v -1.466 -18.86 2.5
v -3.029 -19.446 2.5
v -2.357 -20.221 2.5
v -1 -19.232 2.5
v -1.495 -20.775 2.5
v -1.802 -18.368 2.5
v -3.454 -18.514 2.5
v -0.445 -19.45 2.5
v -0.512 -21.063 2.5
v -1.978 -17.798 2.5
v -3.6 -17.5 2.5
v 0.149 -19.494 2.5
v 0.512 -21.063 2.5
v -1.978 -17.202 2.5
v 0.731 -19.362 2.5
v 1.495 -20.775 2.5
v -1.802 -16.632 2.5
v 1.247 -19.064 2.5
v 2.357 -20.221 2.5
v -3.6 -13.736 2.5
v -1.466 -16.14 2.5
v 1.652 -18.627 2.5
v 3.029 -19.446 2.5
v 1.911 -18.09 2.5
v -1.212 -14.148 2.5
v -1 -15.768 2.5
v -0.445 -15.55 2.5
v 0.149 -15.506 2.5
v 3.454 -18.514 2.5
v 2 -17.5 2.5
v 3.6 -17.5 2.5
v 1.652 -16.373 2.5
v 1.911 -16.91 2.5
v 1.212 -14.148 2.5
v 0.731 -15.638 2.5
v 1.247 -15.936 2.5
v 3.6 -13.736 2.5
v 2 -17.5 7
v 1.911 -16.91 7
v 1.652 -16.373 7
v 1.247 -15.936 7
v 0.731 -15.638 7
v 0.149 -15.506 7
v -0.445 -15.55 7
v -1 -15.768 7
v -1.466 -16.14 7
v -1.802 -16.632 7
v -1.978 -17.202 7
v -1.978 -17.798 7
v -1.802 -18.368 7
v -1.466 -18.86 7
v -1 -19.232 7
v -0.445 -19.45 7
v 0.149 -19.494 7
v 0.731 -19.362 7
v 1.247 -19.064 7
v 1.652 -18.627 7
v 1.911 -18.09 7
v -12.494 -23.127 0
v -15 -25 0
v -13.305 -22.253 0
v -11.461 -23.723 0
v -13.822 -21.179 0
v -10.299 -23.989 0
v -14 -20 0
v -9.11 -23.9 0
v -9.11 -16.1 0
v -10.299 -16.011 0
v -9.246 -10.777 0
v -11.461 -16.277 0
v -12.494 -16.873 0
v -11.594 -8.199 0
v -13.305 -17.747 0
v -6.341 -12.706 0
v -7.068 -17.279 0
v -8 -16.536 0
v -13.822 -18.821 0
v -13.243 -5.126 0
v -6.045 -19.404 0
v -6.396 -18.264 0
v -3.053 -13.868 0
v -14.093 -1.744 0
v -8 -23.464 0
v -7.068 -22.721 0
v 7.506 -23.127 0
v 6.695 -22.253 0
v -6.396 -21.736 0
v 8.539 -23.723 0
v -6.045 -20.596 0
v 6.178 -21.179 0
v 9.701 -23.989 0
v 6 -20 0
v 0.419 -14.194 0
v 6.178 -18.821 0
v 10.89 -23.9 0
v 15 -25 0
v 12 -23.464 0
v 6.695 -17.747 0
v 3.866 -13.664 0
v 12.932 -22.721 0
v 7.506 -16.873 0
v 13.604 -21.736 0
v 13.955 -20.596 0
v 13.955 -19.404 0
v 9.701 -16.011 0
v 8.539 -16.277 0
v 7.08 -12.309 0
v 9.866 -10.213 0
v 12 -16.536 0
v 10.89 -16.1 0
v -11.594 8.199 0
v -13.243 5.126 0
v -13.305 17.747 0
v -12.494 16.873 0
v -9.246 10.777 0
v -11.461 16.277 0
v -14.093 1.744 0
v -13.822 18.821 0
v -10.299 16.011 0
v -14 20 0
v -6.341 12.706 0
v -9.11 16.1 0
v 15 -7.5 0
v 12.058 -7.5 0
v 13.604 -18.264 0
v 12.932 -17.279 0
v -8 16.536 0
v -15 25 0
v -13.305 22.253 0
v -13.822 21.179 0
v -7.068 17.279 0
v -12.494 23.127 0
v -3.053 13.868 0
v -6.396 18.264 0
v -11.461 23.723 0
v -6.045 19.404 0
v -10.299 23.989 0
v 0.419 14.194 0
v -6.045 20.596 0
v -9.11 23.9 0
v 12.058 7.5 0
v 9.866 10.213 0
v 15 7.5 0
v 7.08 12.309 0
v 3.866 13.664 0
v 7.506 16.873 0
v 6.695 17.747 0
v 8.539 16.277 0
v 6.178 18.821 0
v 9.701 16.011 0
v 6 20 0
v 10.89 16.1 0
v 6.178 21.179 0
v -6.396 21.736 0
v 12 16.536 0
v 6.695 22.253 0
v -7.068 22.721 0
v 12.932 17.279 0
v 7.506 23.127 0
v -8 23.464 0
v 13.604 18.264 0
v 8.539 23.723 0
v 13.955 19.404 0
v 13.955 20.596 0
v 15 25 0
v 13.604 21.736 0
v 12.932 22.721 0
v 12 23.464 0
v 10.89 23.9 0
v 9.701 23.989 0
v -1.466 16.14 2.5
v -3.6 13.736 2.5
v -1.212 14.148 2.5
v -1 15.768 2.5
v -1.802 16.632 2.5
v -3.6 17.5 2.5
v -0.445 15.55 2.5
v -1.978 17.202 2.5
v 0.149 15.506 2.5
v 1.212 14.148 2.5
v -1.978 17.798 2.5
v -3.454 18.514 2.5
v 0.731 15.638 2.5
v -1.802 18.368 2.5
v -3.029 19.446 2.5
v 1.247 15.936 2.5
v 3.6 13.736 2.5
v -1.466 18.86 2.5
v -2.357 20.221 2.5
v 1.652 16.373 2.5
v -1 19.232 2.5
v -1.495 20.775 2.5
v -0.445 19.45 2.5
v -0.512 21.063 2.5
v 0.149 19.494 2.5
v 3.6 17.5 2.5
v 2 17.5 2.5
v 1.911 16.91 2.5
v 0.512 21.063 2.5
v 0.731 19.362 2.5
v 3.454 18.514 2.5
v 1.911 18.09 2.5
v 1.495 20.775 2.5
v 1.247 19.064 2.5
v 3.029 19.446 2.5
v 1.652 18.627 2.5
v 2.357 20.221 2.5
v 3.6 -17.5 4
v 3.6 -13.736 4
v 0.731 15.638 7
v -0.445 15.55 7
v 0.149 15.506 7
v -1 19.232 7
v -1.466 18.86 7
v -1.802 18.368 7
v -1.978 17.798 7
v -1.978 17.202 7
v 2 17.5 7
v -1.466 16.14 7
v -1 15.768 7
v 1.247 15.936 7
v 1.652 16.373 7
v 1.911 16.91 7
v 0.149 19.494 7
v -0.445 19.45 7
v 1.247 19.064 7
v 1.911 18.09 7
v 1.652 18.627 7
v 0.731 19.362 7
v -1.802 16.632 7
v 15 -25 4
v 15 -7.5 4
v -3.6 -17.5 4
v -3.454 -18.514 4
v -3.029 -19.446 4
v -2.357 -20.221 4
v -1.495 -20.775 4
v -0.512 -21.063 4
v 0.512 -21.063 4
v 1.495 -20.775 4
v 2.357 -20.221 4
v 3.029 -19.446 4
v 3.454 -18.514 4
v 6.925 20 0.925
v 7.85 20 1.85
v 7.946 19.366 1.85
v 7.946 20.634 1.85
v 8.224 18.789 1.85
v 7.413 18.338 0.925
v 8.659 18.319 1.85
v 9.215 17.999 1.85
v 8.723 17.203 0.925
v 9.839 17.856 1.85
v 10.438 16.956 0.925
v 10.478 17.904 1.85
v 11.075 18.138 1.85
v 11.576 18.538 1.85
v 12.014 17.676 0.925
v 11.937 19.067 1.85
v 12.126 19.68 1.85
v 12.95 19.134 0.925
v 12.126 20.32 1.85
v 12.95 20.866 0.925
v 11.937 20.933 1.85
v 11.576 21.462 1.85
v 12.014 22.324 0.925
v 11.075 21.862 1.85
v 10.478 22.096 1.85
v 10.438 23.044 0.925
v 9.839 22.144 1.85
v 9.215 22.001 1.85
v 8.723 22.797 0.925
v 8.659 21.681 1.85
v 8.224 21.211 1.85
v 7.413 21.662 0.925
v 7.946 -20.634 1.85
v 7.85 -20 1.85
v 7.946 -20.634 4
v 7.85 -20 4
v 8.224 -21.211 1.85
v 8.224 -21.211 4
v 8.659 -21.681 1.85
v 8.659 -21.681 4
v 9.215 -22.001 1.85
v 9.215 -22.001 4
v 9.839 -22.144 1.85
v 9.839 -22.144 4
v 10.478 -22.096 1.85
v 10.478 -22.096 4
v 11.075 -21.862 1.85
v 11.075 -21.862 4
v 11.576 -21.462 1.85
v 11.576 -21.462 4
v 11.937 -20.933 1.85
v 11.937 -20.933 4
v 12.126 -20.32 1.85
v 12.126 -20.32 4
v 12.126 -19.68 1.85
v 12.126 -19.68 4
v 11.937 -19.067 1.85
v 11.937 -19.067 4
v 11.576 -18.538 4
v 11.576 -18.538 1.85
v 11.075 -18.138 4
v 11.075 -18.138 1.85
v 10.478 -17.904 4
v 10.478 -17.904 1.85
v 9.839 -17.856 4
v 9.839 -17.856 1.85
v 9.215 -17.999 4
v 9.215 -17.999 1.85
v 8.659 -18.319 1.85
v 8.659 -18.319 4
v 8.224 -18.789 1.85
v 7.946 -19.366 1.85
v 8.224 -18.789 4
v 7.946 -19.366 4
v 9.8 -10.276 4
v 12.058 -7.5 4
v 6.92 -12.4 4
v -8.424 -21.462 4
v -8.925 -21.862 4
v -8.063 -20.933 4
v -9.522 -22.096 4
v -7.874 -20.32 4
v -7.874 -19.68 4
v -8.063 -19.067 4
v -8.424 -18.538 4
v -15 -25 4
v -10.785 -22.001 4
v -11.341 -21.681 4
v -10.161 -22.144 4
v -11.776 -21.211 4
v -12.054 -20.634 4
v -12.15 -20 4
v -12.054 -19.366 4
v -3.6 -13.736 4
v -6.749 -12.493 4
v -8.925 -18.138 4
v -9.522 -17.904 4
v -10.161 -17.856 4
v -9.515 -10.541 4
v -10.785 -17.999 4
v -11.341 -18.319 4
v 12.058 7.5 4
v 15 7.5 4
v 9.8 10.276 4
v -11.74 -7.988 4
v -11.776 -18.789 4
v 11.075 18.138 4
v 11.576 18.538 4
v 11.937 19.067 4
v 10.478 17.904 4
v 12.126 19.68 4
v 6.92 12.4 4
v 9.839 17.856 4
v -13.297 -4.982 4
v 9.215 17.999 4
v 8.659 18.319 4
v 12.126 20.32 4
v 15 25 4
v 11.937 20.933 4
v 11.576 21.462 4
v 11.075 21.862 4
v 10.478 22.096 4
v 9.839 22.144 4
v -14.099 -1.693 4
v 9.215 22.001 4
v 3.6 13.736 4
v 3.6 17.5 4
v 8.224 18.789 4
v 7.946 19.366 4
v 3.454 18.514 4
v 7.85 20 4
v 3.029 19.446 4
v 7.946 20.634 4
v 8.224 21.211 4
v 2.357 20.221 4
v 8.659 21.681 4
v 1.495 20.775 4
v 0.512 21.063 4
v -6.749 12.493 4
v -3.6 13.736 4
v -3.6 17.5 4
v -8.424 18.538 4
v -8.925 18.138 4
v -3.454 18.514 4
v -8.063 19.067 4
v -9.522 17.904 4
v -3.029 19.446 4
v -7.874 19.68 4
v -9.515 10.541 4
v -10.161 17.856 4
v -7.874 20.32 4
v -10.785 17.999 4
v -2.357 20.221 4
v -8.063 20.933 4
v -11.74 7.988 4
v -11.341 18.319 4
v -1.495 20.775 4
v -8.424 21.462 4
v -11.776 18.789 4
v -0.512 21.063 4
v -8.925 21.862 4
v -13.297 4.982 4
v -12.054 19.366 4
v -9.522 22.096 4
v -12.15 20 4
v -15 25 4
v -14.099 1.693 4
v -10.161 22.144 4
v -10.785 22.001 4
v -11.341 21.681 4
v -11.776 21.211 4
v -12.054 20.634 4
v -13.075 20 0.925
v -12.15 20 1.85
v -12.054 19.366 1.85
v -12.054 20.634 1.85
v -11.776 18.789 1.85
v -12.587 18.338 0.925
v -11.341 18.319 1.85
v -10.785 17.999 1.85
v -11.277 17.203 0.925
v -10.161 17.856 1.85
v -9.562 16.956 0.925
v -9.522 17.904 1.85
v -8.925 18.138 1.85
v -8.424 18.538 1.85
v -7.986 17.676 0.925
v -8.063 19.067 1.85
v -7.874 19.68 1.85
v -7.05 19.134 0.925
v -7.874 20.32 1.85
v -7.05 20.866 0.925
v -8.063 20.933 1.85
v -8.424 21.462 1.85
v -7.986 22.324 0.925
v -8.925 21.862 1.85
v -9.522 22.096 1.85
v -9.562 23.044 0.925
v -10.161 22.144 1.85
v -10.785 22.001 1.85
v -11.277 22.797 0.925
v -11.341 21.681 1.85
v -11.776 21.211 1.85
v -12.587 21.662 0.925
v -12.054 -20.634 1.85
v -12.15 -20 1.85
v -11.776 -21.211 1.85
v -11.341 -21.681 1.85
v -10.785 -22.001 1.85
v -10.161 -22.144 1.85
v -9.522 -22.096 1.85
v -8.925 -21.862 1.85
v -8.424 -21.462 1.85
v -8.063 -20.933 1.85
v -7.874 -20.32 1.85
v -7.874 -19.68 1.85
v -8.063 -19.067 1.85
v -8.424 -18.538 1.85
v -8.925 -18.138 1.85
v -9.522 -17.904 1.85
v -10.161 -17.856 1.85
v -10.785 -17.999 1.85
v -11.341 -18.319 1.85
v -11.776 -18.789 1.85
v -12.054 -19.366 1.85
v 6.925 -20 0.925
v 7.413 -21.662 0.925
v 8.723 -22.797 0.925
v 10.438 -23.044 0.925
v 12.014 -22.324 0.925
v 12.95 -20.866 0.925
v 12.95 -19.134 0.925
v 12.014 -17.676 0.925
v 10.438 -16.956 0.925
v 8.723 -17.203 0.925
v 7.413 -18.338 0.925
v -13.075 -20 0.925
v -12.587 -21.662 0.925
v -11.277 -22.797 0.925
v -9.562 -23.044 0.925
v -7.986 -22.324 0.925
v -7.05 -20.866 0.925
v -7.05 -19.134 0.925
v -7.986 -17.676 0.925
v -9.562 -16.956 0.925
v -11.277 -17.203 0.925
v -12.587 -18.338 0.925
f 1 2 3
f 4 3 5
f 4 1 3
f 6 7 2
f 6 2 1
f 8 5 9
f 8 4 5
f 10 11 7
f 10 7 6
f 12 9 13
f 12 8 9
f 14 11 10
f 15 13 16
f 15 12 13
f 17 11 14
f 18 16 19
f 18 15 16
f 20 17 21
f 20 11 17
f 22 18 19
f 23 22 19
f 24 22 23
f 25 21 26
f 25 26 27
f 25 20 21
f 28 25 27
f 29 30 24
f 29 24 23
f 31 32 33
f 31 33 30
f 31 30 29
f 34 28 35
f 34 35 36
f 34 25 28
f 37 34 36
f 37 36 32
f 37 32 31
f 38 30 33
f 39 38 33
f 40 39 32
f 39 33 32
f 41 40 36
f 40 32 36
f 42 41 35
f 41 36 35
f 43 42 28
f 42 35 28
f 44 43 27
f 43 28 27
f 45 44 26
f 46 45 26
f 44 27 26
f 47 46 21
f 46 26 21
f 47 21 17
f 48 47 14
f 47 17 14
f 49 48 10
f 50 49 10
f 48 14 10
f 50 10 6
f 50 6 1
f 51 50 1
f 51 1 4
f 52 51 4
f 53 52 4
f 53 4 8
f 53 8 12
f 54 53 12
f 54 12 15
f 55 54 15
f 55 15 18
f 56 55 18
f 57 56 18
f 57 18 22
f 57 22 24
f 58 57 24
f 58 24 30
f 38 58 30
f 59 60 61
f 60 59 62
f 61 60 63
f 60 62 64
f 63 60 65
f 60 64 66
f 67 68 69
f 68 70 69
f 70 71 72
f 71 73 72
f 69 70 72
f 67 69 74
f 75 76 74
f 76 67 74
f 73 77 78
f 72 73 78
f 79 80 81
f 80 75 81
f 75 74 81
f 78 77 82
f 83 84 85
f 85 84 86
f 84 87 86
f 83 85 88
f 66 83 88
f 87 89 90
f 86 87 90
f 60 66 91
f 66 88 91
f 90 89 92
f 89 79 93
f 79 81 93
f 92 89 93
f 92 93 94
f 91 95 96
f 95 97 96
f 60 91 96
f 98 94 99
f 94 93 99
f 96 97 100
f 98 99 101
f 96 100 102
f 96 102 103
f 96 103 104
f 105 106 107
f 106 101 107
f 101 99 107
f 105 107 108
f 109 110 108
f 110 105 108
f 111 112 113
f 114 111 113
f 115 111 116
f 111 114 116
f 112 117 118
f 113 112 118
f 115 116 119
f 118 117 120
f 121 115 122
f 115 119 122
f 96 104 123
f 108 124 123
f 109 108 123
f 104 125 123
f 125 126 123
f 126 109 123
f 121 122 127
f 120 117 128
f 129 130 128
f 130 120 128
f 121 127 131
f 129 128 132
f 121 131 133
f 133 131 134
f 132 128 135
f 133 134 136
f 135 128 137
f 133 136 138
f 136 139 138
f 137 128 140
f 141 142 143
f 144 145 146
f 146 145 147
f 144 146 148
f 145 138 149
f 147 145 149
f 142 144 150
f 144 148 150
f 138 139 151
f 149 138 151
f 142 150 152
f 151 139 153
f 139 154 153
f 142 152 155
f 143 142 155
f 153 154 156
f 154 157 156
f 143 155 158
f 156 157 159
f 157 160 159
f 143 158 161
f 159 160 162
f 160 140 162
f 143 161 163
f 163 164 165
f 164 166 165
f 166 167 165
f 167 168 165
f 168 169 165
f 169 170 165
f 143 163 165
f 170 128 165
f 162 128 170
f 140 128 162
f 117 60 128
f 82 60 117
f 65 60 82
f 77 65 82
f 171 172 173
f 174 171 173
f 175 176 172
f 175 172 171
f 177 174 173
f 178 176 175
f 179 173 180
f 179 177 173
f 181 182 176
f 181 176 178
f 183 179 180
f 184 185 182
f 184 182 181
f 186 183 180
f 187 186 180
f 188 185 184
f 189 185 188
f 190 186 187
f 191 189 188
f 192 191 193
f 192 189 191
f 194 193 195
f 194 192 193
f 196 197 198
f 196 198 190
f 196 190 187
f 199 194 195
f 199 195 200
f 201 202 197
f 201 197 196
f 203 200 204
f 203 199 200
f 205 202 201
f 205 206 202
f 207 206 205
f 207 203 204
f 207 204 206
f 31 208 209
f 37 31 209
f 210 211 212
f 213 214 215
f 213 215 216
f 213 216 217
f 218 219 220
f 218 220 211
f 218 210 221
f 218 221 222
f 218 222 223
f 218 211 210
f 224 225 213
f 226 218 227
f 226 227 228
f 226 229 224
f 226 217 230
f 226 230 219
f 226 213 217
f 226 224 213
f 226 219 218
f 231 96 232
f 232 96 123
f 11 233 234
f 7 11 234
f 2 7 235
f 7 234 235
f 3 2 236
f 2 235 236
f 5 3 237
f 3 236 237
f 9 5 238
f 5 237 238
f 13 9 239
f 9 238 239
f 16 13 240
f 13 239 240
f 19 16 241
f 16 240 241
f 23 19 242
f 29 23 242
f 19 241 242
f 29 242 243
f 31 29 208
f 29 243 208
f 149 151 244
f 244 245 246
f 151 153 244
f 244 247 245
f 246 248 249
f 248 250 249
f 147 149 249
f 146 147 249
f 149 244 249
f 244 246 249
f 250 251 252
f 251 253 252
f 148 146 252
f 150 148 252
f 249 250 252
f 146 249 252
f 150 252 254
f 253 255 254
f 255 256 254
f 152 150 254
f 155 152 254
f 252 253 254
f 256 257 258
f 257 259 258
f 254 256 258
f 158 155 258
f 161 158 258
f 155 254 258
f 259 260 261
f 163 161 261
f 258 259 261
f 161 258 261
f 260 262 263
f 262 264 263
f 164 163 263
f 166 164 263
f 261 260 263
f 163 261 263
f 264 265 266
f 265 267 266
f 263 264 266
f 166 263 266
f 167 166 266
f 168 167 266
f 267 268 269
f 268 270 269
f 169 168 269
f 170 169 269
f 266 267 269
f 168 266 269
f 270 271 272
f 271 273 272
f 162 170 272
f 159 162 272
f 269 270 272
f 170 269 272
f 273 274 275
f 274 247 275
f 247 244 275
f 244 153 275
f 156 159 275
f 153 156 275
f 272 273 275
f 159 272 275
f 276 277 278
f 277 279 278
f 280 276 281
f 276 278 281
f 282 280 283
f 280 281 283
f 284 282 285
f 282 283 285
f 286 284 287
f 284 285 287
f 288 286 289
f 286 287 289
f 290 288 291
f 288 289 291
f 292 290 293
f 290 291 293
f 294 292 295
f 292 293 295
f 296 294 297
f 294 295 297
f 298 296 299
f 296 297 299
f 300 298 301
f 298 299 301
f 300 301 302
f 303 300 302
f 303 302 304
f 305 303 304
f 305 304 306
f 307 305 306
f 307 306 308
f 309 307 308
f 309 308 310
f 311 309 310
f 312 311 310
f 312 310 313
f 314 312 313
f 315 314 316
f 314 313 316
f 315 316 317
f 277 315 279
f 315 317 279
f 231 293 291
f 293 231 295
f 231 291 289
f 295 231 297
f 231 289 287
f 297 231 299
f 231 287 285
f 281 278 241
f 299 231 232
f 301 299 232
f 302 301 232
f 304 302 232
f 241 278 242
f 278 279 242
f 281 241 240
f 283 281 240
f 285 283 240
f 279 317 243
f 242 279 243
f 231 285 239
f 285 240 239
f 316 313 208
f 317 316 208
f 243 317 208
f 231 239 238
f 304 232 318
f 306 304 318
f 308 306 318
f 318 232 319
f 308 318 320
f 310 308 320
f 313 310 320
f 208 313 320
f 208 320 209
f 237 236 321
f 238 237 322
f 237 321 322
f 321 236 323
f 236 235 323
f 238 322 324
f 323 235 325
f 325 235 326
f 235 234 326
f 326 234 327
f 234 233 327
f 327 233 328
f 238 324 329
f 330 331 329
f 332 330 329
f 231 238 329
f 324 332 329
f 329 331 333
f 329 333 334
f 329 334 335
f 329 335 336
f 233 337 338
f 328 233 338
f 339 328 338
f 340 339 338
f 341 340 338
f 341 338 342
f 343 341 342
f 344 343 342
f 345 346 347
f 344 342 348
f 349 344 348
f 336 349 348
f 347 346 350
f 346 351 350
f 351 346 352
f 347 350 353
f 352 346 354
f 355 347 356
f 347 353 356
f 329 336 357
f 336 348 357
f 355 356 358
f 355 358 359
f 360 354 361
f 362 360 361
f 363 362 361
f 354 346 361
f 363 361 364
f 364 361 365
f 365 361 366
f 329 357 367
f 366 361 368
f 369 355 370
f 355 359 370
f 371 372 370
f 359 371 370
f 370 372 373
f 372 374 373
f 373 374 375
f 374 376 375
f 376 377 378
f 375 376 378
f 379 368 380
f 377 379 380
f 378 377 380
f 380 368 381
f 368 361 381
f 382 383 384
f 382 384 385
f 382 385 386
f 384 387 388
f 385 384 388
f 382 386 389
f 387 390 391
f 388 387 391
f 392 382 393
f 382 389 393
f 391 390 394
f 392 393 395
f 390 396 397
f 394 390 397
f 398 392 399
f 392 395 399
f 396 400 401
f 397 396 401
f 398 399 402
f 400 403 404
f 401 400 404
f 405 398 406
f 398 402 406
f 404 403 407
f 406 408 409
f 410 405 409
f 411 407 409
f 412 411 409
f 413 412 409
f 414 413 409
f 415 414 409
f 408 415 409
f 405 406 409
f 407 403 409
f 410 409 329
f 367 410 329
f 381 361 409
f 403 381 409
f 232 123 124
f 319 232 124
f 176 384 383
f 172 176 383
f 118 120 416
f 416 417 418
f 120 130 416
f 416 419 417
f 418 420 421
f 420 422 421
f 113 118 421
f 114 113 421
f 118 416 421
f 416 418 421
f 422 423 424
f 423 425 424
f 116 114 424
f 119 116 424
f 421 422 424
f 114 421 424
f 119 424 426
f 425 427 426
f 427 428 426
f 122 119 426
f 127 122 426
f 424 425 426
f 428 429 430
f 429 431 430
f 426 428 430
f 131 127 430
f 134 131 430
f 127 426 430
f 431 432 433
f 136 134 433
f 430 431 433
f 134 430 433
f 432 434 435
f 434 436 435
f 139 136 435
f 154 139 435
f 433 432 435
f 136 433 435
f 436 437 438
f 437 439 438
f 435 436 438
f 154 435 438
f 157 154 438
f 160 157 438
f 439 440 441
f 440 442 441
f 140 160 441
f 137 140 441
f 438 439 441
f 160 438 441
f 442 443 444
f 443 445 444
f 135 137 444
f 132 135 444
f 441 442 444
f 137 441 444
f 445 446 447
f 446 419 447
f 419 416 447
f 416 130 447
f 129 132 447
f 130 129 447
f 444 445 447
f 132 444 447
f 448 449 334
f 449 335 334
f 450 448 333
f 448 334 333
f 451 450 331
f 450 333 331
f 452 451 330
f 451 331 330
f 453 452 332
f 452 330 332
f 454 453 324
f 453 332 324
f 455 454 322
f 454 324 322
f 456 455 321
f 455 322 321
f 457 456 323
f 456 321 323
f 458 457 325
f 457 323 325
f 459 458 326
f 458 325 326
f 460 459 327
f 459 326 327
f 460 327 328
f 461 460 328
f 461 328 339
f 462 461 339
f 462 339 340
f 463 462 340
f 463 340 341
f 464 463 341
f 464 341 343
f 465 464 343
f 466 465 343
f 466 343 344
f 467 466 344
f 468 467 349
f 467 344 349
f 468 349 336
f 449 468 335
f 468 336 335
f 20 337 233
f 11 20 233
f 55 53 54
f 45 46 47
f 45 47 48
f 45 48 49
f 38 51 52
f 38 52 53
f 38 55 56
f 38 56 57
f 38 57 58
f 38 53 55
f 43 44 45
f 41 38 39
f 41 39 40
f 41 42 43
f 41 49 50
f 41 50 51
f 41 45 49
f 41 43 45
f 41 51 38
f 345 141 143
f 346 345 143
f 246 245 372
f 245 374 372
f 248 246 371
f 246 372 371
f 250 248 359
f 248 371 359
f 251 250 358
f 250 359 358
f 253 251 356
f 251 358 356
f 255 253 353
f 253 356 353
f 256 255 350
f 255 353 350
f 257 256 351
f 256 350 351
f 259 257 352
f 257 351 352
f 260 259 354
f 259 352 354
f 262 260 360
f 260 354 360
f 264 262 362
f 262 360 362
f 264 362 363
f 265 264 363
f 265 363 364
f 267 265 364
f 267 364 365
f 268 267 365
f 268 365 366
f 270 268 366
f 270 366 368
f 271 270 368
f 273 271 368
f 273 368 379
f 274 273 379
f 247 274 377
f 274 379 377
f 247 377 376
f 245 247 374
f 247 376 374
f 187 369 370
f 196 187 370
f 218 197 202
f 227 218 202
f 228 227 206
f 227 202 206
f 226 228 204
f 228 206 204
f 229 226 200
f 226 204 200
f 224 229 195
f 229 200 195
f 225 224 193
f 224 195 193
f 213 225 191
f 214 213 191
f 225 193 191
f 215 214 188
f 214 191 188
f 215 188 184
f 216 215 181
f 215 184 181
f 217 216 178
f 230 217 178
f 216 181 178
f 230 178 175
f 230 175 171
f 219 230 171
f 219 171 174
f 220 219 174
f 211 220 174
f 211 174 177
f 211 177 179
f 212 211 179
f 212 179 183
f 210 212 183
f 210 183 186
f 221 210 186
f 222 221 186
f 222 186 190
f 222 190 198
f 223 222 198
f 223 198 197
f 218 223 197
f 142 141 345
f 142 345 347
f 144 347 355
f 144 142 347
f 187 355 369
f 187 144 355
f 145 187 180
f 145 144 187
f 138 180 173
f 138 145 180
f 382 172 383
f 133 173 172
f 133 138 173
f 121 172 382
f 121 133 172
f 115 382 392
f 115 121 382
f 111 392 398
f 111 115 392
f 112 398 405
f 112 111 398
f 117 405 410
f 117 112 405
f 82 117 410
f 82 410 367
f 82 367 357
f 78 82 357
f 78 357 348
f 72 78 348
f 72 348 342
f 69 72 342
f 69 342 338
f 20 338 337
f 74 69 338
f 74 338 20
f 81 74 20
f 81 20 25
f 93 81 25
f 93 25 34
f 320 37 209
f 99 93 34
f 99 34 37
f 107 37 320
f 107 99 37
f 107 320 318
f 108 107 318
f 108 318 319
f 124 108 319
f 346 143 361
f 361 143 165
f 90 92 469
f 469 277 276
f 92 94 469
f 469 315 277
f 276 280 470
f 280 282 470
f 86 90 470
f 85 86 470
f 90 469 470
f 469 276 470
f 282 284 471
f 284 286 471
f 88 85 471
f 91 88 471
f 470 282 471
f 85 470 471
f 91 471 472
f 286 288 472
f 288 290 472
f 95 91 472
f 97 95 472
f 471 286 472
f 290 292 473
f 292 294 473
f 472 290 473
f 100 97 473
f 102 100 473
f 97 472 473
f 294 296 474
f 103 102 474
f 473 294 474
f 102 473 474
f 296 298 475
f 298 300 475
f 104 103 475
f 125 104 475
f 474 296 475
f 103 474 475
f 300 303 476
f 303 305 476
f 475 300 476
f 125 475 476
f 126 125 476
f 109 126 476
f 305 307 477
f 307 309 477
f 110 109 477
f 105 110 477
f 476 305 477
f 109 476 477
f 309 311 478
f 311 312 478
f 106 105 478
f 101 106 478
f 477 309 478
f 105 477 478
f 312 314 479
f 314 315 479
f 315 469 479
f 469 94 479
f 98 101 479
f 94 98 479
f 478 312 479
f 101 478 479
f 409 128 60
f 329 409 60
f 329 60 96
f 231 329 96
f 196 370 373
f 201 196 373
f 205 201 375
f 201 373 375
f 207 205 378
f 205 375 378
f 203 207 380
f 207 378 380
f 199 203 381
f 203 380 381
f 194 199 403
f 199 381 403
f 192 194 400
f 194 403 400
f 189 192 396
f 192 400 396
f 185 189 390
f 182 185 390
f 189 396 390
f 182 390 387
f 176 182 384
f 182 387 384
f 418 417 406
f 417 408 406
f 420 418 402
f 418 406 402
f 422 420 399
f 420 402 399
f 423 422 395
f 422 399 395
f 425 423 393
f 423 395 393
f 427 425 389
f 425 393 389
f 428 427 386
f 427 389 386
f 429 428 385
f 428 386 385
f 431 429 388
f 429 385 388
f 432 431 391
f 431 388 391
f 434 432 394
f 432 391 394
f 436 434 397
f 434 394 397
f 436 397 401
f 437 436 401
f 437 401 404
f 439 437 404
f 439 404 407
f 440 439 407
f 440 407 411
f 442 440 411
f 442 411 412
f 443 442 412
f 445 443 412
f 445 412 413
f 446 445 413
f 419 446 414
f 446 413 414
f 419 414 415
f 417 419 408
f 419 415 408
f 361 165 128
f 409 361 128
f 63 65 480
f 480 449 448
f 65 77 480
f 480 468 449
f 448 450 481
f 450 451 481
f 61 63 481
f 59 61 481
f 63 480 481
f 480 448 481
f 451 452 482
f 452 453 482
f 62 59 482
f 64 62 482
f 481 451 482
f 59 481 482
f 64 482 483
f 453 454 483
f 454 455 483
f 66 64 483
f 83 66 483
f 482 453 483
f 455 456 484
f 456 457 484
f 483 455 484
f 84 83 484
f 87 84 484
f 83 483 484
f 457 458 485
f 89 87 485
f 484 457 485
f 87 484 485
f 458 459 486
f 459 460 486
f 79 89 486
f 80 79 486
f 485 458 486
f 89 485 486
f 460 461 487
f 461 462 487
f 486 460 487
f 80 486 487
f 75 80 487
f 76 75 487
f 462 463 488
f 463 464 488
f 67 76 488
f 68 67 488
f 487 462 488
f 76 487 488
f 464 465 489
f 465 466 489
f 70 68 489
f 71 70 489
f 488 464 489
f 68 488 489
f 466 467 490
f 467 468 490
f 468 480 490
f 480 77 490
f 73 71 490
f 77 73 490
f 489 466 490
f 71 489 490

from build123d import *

# Parameters (mm, degrees)
PAD_DEPTH        = 4
POCKET_DEPTH     = 1.5
SKETCH003_R      = 2
PAD001_DEPTH     = 7
HOLE_D           = 4.3
HOLE_DEPTH       = 25
HOLE_CSINK_D     = 8
HOLE_CSINK_ANGLE = 90


with BuildPart() as part:
    # Sketch → Pad (new body)
    with BuildSketch(Plane.XY):
        with BuildLine():
            ThreePointArc((12.057778, 7.5), (-14.2, 0), (12.057778, -7.5))
            Line((15, -7.5), (12.057778, -7.5))
            Line((15, -25), (15, -7.5))
            Line((-15, -25), (15, -25))
            Line((-15, 25), (-15, -25))
            Line((15, 25), (-15, 25))
            Line((15, 7.5), (15, 25))
            Line((12.057778, 7.5), (15, 7.5))
        make_face()
    extrude(amount=PAD_DEPTH)

    # Sketch002 → Pocket (cut)
    with BuildSketch(Plane.XY.offset(4)):
        with BuildLine():
            ThreePointArc((3.6, 17.5), (0, 21.1), (-3.6, 17.5))
            Line((-3.6, 17.5), (-3.6, -17.5))
            ThreePointArc((-3.6, -17.5), (0, -21.1), (3.6, -17.5))
            Line((3.6, -17.5), (3.6, 17.5))
        make_face()
    extrude(amount=-POCKET_DEPTH, mode=Mode.SUBTRACT)

    # Sketch003 → Pad001 (join)
    with BuildSketch(Plane.XY):
        with Locations((0, 17.5)):
            Circle(SKETCH003_R)
        with Locations((0, -17.5)):
            Circle(SKETCH003_R)
    extrude(amount=PAD001_DEPTH)

    # Hole
    with Locations(Plane(origin=(0, 0, 0), x_dir=(1, 0, 0), z_dir=(0, 0, -1))):
        with Locations((-10, -20), (10, -20), (10, 20), (-10, 20)):
            CounterSinkHole(HOLE_D / 2, HOLE_CSINK_D / 2, depth=HOLE_DEPTH, counter_sink_angle=HOLE_CSINK_ANGLE)


solid = part.part
